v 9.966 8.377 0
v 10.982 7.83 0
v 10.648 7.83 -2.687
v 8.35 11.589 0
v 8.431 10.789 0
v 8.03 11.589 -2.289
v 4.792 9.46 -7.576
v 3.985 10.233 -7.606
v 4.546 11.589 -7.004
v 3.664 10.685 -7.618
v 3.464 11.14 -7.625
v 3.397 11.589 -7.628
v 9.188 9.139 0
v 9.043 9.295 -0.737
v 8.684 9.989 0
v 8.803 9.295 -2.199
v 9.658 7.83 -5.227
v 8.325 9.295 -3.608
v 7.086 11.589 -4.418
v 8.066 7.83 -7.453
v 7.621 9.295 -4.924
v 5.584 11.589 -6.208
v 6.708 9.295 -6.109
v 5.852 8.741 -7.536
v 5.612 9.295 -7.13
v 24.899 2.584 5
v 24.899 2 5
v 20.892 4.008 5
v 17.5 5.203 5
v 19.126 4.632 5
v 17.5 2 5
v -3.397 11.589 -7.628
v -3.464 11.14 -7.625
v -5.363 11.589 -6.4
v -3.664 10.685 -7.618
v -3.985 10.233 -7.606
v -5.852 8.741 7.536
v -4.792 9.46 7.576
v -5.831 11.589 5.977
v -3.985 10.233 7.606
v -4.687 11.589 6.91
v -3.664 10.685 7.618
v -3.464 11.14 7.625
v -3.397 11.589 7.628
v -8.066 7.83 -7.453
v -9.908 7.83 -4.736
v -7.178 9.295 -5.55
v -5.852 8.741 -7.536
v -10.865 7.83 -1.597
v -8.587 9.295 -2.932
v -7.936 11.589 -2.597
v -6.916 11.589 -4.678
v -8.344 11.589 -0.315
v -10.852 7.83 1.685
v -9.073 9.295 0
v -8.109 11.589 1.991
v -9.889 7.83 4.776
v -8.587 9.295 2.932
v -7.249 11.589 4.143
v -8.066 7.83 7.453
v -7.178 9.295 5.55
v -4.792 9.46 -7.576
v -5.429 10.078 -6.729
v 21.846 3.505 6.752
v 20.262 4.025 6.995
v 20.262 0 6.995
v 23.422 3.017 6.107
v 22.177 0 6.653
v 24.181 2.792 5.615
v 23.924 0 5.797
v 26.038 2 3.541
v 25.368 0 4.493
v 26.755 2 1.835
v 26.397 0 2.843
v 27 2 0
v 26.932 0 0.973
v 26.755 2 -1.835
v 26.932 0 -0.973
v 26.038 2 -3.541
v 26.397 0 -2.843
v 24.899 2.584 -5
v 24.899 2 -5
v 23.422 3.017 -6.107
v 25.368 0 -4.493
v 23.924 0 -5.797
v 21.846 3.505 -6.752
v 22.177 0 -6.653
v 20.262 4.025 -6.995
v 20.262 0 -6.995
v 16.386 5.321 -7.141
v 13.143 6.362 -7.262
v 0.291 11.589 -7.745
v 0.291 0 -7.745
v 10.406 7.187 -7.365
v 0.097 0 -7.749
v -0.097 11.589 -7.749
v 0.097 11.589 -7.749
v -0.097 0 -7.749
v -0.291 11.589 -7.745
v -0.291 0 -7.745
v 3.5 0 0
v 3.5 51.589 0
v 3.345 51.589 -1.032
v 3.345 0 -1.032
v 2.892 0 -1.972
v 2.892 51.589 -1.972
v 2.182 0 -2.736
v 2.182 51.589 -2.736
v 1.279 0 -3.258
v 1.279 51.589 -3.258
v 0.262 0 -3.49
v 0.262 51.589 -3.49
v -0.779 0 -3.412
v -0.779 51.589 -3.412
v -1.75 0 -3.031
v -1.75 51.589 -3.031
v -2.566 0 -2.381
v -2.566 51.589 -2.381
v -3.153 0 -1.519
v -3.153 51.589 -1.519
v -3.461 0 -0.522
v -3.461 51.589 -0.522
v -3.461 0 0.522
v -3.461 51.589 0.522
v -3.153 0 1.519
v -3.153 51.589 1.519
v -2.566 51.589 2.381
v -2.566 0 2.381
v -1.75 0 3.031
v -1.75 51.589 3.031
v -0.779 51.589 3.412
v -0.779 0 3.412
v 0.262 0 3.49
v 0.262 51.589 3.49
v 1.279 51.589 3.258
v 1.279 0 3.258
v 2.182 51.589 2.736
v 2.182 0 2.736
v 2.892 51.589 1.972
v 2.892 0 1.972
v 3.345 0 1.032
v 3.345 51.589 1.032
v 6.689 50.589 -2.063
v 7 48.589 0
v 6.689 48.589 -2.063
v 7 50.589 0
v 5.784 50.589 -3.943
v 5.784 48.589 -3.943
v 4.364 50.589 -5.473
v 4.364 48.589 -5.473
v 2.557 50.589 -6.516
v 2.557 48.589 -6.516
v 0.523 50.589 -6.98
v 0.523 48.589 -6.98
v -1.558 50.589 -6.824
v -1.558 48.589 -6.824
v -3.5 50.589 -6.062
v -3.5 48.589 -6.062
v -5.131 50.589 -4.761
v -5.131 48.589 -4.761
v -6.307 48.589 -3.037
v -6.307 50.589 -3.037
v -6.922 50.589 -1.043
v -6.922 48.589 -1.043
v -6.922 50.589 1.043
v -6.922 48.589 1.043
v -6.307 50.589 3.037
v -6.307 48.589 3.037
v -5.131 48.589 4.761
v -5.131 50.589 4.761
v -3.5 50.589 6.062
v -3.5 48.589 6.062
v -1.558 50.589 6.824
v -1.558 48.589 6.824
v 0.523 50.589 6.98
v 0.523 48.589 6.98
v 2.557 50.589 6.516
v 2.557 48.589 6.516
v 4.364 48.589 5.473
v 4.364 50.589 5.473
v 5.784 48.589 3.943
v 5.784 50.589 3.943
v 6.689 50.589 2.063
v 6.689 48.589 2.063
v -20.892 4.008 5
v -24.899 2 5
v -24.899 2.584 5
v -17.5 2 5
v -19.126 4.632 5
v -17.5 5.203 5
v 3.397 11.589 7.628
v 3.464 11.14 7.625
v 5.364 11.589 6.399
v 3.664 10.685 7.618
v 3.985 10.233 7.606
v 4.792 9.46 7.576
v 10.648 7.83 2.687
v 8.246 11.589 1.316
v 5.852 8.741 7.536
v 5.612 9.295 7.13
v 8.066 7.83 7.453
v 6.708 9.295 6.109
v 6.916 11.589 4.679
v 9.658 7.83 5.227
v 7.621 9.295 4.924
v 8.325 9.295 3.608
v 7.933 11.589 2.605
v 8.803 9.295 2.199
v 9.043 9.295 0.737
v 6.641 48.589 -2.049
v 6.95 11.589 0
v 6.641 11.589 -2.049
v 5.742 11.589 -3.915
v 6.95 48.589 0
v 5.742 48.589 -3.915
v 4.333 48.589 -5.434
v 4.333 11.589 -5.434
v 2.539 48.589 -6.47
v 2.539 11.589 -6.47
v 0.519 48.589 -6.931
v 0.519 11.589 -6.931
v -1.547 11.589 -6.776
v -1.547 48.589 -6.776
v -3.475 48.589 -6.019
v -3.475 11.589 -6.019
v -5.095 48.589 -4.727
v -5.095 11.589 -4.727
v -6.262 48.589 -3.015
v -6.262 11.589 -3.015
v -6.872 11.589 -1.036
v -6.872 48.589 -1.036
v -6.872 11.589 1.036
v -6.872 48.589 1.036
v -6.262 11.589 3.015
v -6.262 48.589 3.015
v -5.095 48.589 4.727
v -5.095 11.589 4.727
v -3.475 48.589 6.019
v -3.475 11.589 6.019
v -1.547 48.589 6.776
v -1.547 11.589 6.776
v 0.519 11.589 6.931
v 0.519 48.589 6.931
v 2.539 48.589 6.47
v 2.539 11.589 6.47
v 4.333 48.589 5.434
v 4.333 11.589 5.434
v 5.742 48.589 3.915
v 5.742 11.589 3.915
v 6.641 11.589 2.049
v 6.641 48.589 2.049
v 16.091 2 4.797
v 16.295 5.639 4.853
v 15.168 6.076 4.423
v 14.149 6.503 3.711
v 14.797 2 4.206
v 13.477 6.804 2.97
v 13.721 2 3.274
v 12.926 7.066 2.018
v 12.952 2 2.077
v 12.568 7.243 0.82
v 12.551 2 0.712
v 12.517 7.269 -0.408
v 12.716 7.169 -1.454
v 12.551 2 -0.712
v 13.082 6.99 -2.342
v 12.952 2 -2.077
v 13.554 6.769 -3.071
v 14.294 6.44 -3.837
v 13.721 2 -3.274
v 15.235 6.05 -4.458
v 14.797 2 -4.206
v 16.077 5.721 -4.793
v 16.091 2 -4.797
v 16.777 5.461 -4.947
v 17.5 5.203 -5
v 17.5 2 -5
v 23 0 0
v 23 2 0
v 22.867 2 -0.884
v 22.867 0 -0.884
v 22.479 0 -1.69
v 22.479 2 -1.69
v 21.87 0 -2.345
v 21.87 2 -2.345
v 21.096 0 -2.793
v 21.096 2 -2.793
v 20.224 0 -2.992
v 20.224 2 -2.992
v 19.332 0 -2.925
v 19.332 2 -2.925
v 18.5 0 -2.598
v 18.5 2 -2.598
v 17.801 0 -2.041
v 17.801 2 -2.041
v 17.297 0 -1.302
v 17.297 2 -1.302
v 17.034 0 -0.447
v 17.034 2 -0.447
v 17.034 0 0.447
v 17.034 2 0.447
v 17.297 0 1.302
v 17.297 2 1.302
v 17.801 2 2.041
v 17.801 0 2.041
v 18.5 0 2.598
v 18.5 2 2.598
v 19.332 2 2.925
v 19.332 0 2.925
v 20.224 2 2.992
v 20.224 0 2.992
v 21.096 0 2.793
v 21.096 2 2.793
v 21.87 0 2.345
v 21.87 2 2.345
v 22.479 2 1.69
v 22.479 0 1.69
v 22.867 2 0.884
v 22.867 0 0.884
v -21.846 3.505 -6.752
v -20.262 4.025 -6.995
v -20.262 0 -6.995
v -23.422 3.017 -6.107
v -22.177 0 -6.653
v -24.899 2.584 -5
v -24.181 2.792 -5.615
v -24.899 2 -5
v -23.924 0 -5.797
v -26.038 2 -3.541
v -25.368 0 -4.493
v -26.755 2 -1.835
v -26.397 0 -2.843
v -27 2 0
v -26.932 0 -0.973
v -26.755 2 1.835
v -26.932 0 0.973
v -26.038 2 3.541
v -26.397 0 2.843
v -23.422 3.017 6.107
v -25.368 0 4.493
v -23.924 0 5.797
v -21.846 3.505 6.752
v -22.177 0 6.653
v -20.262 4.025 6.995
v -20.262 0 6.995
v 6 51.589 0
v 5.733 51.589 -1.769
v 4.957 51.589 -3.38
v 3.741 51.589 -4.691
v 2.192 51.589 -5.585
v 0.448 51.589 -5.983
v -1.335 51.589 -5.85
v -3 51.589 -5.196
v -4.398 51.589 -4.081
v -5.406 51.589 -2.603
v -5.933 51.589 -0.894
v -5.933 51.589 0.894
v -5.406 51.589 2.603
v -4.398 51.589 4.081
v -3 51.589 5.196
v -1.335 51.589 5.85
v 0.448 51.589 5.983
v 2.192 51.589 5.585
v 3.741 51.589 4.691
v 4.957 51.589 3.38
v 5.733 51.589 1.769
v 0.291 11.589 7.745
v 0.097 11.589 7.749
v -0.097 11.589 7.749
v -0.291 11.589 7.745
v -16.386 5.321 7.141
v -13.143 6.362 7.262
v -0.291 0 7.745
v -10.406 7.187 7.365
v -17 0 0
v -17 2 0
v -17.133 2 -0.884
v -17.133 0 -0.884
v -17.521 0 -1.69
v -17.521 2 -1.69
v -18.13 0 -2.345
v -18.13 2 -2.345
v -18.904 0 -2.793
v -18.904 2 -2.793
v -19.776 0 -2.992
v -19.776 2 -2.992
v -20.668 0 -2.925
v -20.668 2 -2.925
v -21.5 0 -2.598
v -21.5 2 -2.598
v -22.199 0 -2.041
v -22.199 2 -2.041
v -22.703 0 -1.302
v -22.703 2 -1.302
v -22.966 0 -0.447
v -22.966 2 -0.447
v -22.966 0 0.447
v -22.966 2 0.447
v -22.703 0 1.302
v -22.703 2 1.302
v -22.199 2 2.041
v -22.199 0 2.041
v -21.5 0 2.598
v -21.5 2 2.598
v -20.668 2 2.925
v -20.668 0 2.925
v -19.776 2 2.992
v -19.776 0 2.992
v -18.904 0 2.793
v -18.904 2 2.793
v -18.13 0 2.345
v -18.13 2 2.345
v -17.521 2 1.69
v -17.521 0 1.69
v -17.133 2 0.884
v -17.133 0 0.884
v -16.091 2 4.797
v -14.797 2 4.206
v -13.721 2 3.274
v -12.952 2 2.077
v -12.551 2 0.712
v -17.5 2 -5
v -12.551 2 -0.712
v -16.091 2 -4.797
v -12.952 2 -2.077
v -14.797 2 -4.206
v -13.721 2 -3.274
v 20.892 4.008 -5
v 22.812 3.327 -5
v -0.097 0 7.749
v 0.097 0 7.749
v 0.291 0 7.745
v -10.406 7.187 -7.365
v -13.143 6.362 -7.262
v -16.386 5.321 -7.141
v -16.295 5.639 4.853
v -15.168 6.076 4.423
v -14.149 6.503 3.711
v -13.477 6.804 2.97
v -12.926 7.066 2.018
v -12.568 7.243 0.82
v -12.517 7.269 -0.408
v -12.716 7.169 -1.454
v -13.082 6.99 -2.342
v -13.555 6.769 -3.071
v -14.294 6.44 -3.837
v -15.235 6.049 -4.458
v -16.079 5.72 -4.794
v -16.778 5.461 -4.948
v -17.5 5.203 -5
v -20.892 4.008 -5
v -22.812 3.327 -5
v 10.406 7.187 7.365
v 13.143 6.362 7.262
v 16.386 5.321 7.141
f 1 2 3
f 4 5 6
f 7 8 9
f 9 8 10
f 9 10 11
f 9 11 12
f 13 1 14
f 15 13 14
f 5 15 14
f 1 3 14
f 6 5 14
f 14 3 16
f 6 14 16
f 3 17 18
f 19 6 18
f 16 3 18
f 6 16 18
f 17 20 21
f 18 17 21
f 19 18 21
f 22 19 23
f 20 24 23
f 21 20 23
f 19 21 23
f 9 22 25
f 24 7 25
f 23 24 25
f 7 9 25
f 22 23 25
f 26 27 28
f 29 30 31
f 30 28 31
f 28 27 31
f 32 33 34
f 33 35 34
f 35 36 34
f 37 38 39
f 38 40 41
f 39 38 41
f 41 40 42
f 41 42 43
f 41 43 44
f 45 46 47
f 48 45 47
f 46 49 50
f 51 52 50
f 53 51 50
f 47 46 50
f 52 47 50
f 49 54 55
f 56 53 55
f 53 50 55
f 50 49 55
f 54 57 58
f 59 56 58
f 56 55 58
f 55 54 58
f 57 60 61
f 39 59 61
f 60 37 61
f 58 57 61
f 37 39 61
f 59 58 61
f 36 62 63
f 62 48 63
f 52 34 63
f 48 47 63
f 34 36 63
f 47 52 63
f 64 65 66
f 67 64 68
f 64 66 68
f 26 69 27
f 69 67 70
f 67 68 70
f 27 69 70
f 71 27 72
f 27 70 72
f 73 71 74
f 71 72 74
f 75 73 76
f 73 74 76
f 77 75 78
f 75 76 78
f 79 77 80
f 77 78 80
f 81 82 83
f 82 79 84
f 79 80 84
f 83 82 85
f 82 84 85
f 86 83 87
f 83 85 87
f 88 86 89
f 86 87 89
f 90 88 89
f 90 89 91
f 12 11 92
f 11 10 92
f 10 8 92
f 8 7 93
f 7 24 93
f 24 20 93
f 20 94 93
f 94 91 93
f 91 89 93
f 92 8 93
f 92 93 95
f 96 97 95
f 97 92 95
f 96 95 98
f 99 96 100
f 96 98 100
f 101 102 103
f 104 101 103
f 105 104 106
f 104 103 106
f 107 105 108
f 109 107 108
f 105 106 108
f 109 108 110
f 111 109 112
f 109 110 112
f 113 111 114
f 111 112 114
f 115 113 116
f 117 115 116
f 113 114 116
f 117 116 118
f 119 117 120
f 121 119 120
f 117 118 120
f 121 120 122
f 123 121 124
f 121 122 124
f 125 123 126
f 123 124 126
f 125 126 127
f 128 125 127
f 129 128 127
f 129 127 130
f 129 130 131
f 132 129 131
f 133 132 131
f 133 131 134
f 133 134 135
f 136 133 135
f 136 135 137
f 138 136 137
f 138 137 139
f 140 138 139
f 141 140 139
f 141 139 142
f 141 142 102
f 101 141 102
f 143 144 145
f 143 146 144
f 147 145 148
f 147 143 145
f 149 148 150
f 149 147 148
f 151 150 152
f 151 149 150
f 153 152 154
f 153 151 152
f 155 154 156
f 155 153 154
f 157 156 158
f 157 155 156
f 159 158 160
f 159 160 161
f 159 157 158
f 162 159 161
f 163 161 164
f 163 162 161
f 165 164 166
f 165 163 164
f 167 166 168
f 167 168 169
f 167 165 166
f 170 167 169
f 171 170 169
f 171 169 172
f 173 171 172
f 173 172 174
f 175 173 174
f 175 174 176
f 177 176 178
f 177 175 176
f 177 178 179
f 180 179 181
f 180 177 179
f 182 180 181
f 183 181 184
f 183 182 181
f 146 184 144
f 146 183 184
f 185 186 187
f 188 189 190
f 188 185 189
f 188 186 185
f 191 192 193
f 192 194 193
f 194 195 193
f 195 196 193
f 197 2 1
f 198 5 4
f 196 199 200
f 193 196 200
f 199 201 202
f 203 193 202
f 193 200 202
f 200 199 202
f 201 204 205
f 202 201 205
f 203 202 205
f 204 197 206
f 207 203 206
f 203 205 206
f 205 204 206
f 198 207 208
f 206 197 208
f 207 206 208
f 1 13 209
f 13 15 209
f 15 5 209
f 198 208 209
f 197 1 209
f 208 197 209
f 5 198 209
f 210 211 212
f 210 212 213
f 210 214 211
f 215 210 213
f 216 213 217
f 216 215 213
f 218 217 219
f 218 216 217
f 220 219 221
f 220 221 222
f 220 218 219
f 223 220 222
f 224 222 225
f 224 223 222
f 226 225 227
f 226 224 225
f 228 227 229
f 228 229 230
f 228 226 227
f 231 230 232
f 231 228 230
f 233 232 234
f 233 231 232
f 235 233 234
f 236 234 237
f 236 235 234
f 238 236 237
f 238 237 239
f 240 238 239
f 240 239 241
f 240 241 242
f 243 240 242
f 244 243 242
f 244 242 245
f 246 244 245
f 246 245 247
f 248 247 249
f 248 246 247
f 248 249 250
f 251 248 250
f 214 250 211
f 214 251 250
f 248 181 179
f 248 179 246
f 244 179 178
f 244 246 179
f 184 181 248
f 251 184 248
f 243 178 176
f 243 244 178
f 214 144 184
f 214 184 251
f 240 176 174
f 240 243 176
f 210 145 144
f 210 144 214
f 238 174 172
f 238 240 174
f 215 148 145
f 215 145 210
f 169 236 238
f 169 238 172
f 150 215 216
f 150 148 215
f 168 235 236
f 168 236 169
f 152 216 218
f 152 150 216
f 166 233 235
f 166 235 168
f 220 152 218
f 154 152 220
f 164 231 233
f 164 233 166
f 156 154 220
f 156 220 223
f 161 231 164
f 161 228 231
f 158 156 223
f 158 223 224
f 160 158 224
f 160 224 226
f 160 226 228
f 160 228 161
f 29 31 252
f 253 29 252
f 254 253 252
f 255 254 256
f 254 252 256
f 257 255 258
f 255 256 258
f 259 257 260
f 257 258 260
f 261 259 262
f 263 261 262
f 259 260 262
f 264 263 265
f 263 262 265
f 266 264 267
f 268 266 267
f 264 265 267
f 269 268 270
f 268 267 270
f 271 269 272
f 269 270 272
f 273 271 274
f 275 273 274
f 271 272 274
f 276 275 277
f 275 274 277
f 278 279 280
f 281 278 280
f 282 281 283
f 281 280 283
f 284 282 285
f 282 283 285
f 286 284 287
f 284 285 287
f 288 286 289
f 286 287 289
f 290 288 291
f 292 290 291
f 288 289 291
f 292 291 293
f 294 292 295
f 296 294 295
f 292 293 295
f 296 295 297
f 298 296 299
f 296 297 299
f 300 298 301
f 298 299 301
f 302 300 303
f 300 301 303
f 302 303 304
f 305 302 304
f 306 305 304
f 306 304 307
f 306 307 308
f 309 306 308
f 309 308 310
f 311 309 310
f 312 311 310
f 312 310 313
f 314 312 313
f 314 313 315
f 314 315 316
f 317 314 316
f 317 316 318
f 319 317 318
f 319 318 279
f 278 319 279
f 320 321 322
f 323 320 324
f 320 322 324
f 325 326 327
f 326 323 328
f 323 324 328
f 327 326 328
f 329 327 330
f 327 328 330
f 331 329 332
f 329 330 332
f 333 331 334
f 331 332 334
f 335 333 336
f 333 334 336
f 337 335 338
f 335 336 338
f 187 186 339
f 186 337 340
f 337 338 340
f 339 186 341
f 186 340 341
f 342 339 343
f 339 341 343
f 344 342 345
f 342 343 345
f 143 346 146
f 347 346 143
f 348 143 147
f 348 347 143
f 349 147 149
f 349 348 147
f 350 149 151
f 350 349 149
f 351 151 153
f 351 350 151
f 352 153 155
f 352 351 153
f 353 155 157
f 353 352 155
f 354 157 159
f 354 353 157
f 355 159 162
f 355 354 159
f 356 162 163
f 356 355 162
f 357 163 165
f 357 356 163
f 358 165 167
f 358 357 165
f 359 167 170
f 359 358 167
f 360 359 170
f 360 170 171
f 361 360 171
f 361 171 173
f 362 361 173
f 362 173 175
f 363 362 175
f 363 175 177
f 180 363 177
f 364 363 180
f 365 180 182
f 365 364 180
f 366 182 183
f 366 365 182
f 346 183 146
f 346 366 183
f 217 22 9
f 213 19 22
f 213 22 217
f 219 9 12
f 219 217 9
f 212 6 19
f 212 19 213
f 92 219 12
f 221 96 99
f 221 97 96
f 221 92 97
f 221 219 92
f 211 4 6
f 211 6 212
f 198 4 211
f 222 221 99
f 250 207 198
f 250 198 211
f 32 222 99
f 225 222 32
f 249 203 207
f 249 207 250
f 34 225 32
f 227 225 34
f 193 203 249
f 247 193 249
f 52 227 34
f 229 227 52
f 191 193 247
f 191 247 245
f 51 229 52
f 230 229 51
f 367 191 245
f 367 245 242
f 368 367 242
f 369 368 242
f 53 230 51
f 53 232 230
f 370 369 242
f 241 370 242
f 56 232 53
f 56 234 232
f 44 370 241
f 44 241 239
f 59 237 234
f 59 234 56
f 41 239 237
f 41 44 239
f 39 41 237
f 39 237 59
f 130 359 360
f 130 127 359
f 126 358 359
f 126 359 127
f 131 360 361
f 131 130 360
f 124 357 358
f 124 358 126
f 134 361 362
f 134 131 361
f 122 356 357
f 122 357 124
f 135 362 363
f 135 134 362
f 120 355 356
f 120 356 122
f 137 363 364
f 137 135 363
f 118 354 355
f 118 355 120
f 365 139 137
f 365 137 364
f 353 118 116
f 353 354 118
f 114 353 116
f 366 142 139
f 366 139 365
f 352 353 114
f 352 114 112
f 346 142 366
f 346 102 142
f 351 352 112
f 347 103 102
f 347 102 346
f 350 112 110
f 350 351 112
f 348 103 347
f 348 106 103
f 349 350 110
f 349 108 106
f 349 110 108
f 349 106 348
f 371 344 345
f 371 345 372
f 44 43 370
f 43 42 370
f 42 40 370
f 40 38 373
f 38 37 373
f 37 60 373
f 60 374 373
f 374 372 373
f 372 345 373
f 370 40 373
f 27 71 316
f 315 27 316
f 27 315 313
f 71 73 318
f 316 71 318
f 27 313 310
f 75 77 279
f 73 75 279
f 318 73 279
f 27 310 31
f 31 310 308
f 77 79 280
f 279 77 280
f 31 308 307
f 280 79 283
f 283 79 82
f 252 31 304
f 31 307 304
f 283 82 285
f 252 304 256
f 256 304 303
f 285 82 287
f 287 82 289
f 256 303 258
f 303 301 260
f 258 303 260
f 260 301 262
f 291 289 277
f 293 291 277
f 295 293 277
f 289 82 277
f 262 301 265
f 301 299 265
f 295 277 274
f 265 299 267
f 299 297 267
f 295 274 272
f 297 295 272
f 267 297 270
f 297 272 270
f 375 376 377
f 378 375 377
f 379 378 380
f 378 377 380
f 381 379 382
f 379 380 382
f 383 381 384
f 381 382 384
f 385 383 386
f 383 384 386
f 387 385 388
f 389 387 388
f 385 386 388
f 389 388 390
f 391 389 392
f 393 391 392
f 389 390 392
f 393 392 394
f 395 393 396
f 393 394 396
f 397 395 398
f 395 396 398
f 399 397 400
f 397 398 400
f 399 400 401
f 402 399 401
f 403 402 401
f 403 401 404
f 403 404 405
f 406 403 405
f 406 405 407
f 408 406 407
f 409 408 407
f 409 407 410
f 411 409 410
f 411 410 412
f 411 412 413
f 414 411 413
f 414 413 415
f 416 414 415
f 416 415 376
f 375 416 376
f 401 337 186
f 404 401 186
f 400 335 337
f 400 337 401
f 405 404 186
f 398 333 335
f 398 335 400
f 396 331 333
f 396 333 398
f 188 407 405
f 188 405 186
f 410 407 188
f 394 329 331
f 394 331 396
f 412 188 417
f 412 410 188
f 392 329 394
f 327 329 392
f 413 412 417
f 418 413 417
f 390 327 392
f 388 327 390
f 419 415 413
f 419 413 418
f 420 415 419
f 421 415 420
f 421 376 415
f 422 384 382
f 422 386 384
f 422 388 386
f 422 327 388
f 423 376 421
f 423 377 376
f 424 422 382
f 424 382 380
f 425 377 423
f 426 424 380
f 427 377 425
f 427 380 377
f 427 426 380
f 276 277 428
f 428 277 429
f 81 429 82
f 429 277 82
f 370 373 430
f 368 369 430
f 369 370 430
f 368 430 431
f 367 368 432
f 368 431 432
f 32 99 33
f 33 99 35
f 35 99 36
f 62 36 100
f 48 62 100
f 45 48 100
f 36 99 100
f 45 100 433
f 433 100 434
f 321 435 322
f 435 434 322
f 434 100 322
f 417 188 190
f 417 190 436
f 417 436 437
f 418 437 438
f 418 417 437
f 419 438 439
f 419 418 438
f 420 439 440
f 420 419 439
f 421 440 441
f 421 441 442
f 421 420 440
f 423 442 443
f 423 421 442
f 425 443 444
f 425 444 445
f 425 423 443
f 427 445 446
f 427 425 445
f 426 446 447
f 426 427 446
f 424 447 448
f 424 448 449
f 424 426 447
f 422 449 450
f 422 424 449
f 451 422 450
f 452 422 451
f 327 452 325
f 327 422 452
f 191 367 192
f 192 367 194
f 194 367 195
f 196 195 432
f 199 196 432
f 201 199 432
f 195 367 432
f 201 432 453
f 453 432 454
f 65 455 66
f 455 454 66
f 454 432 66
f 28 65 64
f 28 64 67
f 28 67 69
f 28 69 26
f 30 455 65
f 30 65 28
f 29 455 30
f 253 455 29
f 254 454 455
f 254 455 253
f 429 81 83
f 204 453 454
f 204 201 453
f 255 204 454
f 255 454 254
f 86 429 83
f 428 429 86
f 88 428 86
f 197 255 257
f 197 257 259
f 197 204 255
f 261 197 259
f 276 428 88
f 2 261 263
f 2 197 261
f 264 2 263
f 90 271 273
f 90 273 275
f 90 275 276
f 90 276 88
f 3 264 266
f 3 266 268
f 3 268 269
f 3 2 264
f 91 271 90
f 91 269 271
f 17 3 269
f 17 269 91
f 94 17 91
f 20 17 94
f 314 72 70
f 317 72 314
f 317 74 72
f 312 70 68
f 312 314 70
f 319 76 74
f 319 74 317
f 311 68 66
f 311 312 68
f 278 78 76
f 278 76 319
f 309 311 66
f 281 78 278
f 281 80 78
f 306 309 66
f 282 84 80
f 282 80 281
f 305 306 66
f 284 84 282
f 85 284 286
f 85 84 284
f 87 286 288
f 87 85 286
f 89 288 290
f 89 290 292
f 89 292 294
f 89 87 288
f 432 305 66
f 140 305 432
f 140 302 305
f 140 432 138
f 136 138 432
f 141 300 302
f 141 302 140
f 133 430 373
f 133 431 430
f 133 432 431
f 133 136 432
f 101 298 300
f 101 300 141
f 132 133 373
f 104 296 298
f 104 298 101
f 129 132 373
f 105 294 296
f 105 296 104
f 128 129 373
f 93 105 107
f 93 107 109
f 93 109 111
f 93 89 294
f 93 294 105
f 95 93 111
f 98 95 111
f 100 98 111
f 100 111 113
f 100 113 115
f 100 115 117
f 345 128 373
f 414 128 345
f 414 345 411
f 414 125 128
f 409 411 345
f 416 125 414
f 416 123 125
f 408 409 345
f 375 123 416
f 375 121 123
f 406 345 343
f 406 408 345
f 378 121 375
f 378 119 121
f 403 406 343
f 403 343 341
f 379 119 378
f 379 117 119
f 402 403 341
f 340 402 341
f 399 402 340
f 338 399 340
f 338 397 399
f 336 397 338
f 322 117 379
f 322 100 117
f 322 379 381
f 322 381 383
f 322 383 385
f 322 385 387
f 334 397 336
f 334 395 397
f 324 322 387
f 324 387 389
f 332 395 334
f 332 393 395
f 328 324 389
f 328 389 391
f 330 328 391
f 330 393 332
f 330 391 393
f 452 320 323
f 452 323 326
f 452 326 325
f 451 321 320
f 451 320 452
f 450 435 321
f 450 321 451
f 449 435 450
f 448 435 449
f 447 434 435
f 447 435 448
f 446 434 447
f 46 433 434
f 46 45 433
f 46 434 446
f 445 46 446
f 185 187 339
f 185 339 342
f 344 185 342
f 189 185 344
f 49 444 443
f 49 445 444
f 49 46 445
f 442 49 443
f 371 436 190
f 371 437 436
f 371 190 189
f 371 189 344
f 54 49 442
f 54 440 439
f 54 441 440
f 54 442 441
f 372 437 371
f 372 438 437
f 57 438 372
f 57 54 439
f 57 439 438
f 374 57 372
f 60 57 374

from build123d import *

# Parameters (mm, degrees)
SZKIC1_W                        = 27
SZKIC1_H                        = 25
ZAOKR_GLENIE1_R                 = 4
SZKIC4_R                        = 3
WYTNIJ_WYCI_GNI_CIE3_DEPTH      = 24.0000001
WYTNIJ_WYCI_GNI_CIE3_DEPTH_BACK = 3
WYTNIJ_WYCI_GNI_CIE2_DEPTH      = 24.0000001
SZKIC5_OUTSIDE_W                = 72.072
SZKIC5_OUTSIDE_H                = 72.072
WYTNIJ_WYCI_GNI_CIE4_DEPTH      = 26.0000001
SZKIC8_W                        = 8.35
SZKIC8_H                        = 13.411124978
SZKIC10_R                       = 3.5
WYTNIJ_WYCI_GNI_CIE5_DEPTH      = 52.588875122


with BuildPart() as part:
    # Szkic1 → Obrót1 (revolve)
    with BuildSketch(Plane.XY):
        with Locations((13.5, 12.5)):
            Rectangle(SZKIC1_W, SZKIC1_H)
    revolve(axis=Axis((0, 0, 0), (0, 1, 0)))

    # Szkic2 → Wycięcie-obrót1 (revolve, cut)
    with BuildSketch(Plane.XY):
        Polygon((27, 25), (27, 2), (8.35, 8.788044869), (8.35, 25), align=None)
    revolve(axis=Axis((0, 0, 0), (0, 1, 0)), mode=Mode.SUBTRACT)

    # Zaokrąglenie1
    zaokr_glenie1_edges = [part.edges().sort_by_distance(p)[0] for p in [
        (-8.35, 8.788044869, 0),
    ]]
    fillet(zaokr_glenie1_edges, radius=ZAOKR_GLENIE1_R)

    # Szkic4 → Wytnij-wyciągnięcie3 (cut, two sides)
    with BuildSketch(Plane(origin=(0, 2, 0), x_dir=(1, 0, 0), z_dir=(0, 1, 0))) as wytnij_wyci_gni_cie3_sk:
        with Locations((-20, 0)):
            Circle(SZKIC4_R)
        with Locations((20, 0)):
            Circle(SZKIC4_R)
    extrude(amount=WYTNIJ_WYCI_GNI_CIE3_DEPTH, mode=Mode.SUBTRACT)
    extrude(wytnij_wyci_gni_cie3_sk.sketch, amount=-WYTNIJ_WYCI_GNI_CIE3_DEPTH_BACK, mode=Mode.SUBTRACT)

    # Szkic3 → Wytnij-wyciągnięcie2 (cut, through all)
    with BuildSketch(Plane(origin=(0, 2, 0), x_dir=(1, 0, 0), z_dir=(0, 1, 0))):
        with BuildLine():
            Line((-17.5, 5), (-26.532998323, 5))
            ThreePointArc((-26.532998323, 5), (-27, 0), (-26.532998323, -5))
            Line((-26.532998323, -5), (-17.5, -5))
            ThreePointArc((-17.5, -5), (-12.5, 0), (-17.5, 5))
        make_face()
        with BuildLine():
            Line((17.5, 5), (26.532998323, 5))
            ThreePointArc((26.532998323, 5), (27, 0), (26.532998323, -5))
            Line((26.532998323, -5), (17.5, -5))
            ThreePointArc((17.5, -5), (12.5, 0), (17.5, 5))
        make_face()
    extrude(amount=WYTNIJ_WYCI_GNI_CIE2_DEPTH, mode=Mode.SUBTRACT)

    # Szkic5 outside → Wytnij-wyciągnięcie4 (cut, through all)
    with BuildSketch(Plane.XZ):
        Rectangle(SZKIC5_OUTSIDE_W, SZKIC5_OUTSIDE_H)
        with BuildLine():
            Line((-20.2625, 6.995076393), (-0.290625, 7.744548864))
            ThreePointArc((-0.290625, 7.744548864), (0, 7.75), (0.290625, 7.744548864))
            Line((0.290625, 7.744548864), (20.2625, 6.995076393))
            ThreePointArc((20.2625, 6.995076393), (27, 0), (20.2625, -6.995076393))
            Line((20.2625, -6.995076393), (0.290625, -7.744548864))
            ThreePointArc((0.290625, -7.744548864), (0, -7.75), (-0.290625, -7.744548864))
            Line((-0.290625, -7.744548864), (-20.2625, -6.995076393))
            ThreePointArc((-20.2625, -6.995076393), (-27, 0), (-20.2625, 6.995076393))
        make_face(mode=Mode.SUBTRACT)
    extrude(amount=-WYTNIJ_WYCI_GNI_CIE4_DEPTH, mode=Mode.SUBTRACT)

    # Szkic8 → Wycięcie-obrót2 (revolve, cut)
    with BuildSketch(Plane.XY):
        with Locations((4.175, 18.294437511)):
            Rectangle(SZKIC8_W, SZKIC8_H)
    revolve(axis=Axis((0, 25, 0), (0, -1, 0)), mode=Mode.SUBTRACT)

    # Szkic9 → Obrót2 (revolve)
    with BuildSketch(Plane.XY):
        Polygon((6, 51.588875022), (0, 51.588875022), (0, 11.588875022), (6.95, 11.588875022), (6.95, 48.588875022), (7, 48.588875022), (7, 50.588875022), align=None)
    revolve(axis=Axis((0, 11.588875022, 0), (0, 1, 0)))

    # Szkic10 → Wytnij-wyciągnięcie5 (cut, through all)
    with BuildSketch(Plane(origin=(0, 51.588875022, 0), x_dir=(1, 0, 0), z_dir=(0, 1, 0))):
        Circle(SZKIC10_R)
    extrude(amount=-WYTNIJ_WYCI_GNI_CIE5_DEPTH, mode=Mode.SUBTRACT)


solid = part.part
